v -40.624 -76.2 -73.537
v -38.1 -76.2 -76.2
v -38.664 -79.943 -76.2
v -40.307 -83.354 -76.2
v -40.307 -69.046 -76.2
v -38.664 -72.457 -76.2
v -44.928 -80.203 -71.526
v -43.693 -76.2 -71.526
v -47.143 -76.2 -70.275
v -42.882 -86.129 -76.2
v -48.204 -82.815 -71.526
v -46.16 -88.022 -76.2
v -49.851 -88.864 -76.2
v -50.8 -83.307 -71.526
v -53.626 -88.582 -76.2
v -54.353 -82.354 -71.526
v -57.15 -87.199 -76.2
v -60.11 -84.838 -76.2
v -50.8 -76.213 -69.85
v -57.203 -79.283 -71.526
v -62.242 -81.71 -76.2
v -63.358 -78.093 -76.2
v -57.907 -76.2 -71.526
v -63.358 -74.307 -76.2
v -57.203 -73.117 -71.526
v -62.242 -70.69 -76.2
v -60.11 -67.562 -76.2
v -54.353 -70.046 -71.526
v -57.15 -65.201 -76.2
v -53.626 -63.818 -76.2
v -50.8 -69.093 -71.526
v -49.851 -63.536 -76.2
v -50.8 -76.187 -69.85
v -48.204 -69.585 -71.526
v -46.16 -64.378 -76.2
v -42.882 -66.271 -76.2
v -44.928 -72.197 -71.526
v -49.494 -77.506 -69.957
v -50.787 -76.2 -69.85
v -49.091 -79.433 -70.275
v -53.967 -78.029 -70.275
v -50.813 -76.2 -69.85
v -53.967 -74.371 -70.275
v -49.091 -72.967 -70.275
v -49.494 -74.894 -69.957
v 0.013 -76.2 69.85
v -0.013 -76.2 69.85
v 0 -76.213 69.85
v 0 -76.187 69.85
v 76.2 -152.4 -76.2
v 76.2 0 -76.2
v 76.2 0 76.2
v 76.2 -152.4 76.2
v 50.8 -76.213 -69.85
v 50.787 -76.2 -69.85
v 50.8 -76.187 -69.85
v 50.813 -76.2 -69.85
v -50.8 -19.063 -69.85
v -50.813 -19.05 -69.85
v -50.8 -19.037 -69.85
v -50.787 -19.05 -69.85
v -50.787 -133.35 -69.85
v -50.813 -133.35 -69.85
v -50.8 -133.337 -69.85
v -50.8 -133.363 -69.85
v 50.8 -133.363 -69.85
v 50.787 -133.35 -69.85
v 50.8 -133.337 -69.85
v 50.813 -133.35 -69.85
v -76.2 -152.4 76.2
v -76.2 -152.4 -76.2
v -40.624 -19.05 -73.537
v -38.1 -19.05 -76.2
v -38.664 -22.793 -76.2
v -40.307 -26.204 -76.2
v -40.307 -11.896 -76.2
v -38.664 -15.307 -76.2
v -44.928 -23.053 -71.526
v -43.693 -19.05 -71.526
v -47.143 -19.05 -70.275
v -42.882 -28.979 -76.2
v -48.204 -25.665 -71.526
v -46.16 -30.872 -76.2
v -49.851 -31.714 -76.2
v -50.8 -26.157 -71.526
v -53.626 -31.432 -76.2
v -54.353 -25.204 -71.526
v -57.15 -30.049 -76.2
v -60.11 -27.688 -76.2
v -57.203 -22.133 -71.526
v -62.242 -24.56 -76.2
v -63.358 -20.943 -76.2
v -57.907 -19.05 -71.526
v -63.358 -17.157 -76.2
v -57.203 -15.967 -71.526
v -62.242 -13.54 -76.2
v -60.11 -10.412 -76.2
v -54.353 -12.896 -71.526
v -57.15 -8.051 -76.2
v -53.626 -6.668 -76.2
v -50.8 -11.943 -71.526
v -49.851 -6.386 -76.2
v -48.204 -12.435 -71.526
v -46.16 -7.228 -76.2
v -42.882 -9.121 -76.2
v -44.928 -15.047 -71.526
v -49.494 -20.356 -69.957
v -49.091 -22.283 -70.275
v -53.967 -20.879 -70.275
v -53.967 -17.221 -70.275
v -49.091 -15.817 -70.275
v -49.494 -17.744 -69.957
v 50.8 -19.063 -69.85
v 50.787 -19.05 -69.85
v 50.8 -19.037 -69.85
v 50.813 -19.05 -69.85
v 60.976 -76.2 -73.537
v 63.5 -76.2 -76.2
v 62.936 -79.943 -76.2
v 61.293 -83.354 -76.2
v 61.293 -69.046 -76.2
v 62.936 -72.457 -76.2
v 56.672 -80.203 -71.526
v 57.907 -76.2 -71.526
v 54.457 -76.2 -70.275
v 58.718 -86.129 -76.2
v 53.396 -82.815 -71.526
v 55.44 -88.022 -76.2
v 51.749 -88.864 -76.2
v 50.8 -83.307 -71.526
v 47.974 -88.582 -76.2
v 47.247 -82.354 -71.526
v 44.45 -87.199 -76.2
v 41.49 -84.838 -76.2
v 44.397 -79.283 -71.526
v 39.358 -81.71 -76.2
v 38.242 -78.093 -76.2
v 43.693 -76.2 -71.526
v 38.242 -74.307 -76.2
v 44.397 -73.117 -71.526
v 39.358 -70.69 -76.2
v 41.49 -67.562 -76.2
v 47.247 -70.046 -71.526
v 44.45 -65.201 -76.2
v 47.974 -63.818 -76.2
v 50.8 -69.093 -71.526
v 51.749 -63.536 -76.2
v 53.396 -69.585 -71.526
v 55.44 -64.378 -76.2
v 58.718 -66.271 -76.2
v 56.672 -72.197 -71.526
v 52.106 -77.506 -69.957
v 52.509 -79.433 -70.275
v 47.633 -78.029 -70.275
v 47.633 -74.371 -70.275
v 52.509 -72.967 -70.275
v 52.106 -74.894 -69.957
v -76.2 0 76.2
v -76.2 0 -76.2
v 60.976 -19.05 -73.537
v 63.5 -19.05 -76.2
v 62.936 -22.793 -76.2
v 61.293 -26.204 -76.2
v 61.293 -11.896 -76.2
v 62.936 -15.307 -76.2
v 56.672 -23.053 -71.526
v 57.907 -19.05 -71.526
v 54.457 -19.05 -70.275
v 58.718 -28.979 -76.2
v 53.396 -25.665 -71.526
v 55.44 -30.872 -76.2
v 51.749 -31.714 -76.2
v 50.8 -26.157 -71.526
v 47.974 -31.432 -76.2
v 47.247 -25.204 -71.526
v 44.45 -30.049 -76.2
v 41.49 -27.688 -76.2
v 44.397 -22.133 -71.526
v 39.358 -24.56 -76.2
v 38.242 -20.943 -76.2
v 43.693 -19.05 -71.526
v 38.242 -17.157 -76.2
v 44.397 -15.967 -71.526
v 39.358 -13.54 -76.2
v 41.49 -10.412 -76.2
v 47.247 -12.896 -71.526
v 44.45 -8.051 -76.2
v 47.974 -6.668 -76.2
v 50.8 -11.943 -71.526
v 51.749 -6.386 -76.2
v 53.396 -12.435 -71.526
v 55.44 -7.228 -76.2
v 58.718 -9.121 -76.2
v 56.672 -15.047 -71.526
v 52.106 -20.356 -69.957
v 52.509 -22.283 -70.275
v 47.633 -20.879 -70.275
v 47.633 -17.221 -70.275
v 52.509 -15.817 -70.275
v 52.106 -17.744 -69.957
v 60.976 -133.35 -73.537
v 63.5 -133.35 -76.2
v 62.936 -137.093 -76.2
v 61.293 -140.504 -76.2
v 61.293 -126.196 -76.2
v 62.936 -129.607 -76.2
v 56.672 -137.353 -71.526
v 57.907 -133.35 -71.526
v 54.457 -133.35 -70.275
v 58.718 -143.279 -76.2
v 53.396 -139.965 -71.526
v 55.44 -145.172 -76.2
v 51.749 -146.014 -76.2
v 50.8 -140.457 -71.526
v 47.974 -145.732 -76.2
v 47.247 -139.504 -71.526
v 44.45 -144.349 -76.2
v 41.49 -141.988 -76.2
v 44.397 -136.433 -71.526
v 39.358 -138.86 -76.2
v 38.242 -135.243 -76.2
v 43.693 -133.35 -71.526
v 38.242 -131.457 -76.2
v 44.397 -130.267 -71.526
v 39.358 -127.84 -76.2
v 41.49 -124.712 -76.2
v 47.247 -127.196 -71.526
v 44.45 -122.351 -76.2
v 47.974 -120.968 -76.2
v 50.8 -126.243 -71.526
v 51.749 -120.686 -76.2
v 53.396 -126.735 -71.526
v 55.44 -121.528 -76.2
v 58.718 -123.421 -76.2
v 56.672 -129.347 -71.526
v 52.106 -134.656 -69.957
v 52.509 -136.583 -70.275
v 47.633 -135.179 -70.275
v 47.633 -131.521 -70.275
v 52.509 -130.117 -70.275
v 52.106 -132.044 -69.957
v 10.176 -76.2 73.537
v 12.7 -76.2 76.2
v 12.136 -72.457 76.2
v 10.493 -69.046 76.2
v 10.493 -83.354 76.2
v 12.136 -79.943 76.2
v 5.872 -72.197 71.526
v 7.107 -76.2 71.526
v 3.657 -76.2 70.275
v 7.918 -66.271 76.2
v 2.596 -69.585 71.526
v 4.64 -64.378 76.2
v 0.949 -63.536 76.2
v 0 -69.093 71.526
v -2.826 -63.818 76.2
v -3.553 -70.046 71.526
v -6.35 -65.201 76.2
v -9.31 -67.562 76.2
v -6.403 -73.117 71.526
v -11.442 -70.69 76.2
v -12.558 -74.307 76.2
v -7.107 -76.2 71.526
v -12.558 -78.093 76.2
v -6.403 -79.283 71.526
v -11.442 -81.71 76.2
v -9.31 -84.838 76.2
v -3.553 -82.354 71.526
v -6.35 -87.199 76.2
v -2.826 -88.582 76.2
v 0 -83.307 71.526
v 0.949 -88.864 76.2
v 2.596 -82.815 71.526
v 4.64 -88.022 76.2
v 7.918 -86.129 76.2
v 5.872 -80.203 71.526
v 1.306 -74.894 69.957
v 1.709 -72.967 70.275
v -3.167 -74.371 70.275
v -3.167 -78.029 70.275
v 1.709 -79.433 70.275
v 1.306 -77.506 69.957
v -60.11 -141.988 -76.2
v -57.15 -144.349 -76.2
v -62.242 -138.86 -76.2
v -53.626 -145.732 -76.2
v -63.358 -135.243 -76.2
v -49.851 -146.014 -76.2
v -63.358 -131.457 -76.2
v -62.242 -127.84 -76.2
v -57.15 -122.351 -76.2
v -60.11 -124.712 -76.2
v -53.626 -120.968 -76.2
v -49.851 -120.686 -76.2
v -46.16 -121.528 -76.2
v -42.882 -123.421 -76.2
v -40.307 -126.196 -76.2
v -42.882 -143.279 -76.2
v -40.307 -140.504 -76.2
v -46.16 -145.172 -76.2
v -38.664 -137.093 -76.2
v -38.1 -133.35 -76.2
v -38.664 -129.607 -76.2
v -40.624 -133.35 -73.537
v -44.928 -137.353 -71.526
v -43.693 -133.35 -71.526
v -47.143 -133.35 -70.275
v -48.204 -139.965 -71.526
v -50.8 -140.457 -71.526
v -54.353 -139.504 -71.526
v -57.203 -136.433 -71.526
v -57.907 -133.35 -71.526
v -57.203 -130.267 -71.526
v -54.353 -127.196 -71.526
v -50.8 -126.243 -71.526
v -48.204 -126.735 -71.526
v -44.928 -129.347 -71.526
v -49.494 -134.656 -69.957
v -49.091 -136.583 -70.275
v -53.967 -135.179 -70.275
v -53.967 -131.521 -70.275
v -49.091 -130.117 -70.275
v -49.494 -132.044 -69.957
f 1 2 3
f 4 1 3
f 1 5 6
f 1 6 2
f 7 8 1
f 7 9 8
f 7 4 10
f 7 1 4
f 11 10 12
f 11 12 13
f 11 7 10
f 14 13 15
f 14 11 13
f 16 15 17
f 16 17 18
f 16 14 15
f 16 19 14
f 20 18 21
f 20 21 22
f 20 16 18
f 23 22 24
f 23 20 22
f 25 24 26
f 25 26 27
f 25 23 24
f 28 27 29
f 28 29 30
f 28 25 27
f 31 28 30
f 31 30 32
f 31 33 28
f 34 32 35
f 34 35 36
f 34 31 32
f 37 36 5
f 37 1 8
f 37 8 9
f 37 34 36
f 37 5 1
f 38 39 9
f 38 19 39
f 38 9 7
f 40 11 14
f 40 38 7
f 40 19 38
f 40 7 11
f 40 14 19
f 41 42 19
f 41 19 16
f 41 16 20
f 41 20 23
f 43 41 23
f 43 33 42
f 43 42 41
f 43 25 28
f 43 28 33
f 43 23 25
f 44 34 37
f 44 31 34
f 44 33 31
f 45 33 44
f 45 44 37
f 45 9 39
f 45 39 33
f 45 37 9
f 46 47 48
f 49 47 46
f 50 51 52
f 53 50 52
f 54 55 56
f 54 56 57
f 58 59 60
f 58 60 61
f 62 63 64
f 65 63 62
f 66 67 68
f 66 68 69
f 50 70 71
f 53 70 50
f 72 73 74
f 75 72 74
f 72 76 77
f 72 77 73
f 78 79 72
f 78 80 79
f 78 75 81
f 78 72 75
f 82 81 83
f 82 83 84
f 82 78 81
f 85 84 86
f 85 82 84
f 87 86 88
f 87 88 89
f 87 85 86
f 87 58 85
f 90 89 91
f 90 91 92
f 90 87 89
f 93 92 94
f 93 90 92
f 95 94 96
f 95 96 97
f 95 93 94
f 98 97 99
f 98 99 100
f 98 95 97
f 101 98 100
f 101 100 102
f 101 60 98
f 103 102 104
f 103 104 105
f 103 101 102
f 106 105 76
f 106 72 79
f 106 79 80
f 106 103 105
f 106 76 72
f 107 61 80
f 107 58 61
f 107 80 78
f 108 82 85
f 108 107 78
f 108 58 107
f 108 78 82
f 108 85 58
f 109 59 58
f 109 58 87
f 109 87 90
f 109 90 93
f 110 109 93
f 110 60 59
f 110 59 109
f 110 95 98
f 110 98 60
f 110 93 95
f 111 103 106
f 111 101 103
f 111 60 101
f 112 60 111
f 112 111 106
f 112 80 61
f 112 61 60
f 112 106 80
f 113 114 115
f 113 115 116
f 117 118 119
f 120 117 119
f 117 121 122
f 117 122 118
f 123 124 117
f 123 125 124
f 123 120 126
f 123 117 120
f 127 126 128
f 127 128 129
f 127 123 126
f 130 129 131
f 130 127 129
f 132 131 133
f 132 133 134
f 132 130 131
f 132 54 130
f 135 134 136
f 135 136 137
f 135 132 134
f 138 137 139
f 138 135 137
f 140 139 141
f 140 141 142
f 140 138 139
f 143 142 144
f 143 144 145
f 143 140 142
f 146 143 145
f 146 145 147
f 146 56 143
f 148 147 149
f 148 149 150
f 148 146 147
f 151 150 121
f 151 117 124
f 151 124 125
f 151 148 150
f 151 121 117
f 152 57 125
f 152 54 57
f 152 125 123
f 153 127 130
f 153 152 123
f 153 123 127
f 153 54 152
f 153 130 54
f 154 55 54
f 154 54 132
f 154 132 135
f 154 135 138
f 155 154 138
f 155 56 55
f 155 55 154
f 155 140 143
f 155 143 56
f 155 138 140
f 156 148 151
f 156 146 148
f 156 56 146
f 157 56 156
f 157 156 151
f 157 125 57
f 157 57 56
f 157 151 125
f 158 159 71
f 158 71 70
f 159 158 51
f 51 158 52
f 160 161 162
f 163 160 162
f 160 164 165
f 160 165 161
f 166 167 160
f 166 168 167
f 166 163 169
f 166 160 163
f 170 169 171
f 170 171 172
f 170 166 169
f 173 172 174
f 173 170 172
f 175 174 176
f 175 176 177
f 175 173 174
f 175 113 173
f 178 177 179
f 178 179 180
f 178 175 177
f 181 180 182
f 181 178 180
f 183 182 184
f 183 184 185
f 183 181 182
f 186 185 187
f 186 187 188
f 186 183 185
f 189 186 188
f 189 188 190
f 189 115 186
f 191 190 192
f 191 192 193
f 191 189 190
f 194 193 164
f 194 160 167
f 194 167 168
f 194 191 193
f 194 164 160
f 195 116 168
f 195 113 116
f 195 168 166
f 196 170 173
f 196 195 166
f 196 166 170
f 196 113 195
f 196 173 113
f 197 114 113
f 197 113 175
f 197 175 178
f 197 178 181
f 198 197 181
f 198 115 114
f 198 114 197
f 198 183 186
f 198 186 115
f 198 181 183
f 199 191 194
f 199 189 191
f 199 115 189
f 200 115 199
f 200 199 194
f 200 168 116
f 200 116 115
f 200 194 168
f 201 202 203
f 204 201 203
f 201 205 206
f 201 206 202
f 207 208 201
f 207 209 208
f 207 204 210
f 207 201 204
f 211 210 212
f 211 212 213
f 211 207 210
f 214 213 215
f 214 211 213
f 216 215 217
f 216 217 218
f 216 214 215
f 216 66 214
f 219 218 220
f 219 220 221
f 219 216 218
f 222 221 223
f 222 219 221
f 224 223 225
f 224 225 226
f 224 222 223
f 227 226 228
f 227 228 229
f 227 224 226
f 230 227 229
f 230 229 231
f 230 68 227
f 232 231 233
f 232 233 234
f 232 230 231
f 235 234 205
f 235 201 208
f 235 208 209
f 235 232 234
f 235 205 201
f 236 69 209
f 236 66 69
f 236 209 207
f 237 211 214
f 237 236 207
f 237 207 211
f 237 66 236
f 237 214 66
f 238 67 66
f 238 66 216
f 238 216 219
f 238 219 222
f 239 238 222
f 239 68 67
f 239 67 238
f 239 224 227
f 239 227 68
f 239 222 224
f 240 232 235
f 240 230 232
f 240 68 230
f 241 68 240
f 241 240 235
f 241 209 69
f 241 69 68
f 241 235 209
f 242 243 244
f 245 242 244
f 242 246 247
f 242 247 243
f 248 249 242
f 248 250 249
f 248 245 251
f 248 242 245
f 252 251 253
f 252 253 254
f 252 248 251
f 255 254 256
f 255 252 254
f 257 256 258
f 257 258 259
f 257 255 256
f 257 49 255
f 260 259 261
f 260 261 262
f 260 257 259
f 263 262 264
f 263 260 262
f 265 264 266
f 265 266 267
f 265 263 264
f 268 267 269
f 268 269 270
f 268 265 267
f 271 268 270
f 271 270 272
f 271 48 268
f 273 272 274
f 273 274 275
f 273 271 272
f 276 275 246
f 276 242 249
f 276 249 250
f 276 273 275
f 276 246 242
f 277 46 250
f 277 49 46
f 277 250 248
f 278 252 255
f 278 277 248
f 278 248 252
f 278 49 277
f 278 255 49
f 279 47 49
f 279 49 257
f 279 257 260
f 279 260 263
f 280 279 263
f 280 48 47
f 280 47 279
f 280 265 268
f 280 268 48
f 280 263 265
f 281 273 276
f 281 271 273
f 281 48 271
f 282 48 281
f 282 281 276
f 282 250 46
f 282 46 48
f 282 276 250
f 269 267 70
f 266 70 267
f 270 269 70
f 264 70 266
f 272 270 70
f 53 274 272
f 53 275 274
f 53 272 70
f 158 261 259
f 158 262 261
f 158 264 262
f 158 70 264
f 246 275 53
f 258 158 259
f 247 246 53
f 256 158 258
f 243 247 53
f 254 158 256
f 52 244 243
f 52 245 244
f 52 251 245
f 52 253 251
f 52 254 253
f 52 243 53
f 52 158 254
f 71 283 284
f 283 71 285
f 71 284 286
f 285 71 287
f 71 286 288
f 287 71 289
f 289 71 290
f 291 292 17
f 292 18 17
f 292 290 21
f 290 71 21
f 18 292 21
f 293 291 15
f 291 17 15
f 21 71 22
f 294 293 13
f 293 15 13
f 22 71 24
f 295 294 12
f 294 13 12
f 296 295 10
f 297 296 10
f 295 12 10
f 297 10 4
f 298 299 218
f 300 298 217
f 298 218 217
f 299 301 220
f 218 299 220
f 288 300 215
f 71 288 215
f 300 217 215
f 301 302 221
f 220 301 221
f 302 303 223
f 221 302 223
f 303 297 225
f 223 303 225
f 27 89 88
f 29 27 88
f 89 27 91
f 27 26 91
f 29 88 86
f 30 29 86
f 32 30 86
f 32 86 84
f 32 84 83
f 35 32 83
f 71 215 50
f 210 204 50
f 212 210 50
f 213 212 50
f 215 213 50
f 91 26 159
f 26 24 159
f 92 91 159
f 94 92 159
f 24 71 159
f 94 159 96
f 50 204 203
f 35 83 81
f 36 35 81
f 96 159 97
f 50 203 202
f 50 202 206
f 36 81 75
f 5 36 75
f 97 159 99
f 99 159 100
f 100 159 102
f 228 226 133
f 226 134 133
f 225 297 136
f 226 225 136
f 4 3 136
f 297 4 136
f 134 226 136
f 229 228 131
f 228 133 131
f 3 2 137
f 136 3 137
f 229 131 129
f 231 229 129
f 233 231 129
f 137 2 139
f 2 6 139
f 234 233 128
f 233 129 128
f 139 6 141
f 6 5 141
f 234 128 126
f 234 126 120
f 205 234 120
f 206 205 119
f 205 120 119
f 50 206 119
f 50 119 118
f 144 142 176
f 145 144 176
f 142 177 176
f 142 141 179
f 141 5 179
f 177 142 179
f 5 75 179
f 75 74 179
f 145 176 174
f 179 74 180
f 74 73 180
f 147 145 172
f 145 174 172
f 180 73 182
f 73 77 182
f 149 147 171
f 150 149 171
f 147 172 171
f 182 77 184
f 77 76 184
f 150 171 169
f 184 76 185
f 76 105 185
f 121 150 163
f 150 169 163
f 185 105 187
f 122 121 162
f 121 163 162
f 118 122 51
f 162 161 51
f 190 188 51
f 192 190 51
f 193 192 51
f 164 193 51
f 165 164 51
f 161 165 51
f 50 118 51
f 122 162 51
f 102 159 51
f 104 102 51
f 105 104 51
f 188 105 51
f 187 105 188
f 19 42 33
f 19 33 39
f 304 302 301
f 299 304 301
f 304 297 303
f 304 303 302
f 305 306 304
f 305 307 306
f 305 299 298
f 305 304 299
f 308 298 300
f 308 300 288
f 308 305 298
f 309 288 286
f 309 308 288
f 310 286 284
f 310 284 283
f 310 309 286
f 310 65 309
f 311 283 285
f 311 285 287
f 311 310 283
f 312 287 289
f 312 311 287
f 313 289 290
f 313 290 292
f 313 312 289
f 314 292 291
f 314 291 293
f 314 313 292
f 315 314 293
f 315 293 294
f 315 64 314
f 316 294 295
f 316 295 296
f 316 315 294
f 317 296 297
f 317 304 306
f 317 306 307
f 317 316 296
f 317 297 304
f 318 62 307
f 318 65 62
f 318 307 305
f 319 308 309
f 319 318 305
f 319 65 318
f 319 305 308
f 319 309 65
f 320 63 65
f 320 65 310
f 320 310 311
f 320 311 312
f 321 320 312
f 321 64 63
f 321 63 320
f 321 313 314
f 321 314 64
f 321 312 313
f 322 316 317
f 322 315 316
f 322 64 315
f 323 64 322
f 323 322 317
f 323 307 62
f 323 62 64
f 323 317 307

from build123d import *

# Parameters (mm, degrees)
F0_W     = 152.4
F0_H     = 152.4
F1_DEPTH = 152.4
F2_R     = 12.7
F3_DEPTH = 6.35
F5_R     = 12.7
F6_DEPTH = 6.35
F8_R     = 12.7
F9_DEPTH = 6.35


# Not quite as in the source:
# - a fillet or chamfer that OpenCascade refuses, or shapes differently, is made with other operations: its cross-section is extruded or revolved along the edge and cut away or added


with BuildPart() as f1:
    # F0 (on Front) → F1 (new body)
    with BuildSketch(Plane.XZ):
        Rectangle(F0_W, F0_H)
    extrude(amount=F1_DEPTH)

    # F2 (on face) → F3 (cut)
    with BuildSketch(Plane.XY.offset(76.2)):
        with Locations((0, -76.2)):
            Circle(F2_R)
    extrude(amount=-F3_DEPTH, mode=Mode.SUBTRACT)

    # F4: fillet of radius 15.8496 on 1 edges, made by hand

    # F4_s1 → F4_t2 (revolve)
    with BuildSketch(Plane.XZ.offset(76.2)):
        with BuildLine():
            ThreePointArc((12.7, 76.2), (7.1065402986, 71.5261268844), (0.0127063564, 69.85))
            Line((0.0127063564, 69.85), (12.7, 69.85))
            Line((12.7, 69.85), (12.7, 76.2))
        make_face()
    revolve(axis=Axis((0, -76.2, 69.85), (0, 0, 1)))

    # F5 (on face) → F6 (cut)
    with BuildSketch(Plane(origin=(0, 0, -76.2), x_dir=(1, 0, 0), z_dir=(0, 0, -1))):
        with Locations((50.8, 19.05)):
            Circle(F5_R)
        with Locations((50.8, 76.2)):
            Circle(F5_R)
        with Locations((-50.8, 19.05)):
            Circle(F5_R)
        with Locations((-50.8, 76.2)):
            Circle(F5_R)
        with Locations((-50.8, 133.35)):
            Circle(F5_R)
        with Locations((50.8, 133.35)):
            Circle(F5_R)
    extrude(amount=-F6_DEPTH, mode=Mode.SUBTRACT)

    # F7: fillet of radius 15.8496 on 6 edges, made by hand

    # F7_s1 → F7_t2 (revolve)
    with BuildSketch(Plane.XZ.offset(19.05)):
        with BuildLine():
            ThreePointArc((63.5, -76.2), (57.9065402986, -71.5261268844), (50.8127063564, -69.85))
            Line((50.8127063564, -69.85), (63.5, -69.85))
            Line((63.5, -69.85), (63.5, -76.2))
        make_face()
    revolve(axis=Axis((50.8, -19.05, -69.85), (0, 0, -1)))

    # F7_s3 → F7_t4 (revolve)
    with BuildSketch(Plane.XZ.offset(76.2)):
        with BuildLine():
            ThreePointArc((63.5, -76.2), (57.9065402986, -71.5261268844), (50.8127063564, -69.85))
            Line((50.8127063564, -69.85), (63.5, -69.85))
            Line((63.5, -69.85), (63.5, -76.2))
        make_face()
    revolve(axis=Axis((50.8, -76.2, -69.85), (0, 0, -1)))

    # F7_s5 → F7_t6 (revolve)
    with BuildSketch(Plane.XZ.offset(133.35)):
        with BuildLine():
            ThreePointArc((63.5, -76.2), (57.9065402986, -71.5261268844), (50.8127063564, -69.85))
            Line((50.8127063564, -69.85), (63.5, -69.85))
            Line((63.5, -69.85), (63.5, -76.2))
        make_face()
    revolve(axis=Axis((50.8, -133.35, -69.85), (0, 0, -1)))

    # F7_s7 → F7_t8 (revolve)
    with BuildSketch(Plane.XZ.offset(19.05)):
        with BuildLine():
            ThreePointArc((-38.1, -76.2), (-43.6934597014, -71.5261268844), (-50.7872936436, -69.85))
            Line((-50.7872936436, -69.85), (-38.1, -69.85))
            Line((-38.1, -69.85), (-38.1, -76.2))
        make_face()
    revolve(axis=Axis((-50.8, -19.05, -69.85), (0, 0, -1)))

    # F7_s9 → F7_t10 (revolve)
    with BuildSketch(Plane.XZ.offset(76.2)):
        with BuildLine():
            ThreePointArc((-38.1, -76.2), (-43.6934597014, -71.5261268844), (-50.7872936436, -69.85))
            Line((-50.7872936436, -69.85), (-38.1, -69.85))
            Line((-38.1, -69.85), (-38.1, -76.2))
        make_face()
    revolve(axis=Axis((-50.8, -76.2, -69.85), (0, 0, -1)))

    # F7_s11 → F7_t12 (revolve)
    with BuildSketch(Plane.XZ.offset(133.35)):
        with BuildLine():
            ThreePointArc((-38.1, -76.2), (-43.6934597014, -71.5261268844), (-50.7872936436, -69.85))
            Line((-50.7872936436, -69.85), (-38.1, -69.85))
            Line((-38.1, -69.85), (-38.1, -76.2))
        make_face()
    revolve(axis=Axis((-50.8, -133.35, -69.85), (0, 0, -1)))

    # F8 (on face) → F9 (join)
    with BuildSketch(Plane(origin=(0, 0, 0), x_dir=(-1, 0, 0), z_dir=(0, 1, 0))):
        with Locations((50.8, -57.15)):
            Circle(F8_R)
        with Locations((-50.8, -57.15)):
            Circle(F8_R)
        with Locations((-50.8, 57.15)):
            Circle(F8_R)
        with Locations((50.8, 57.15)):
            Circle(F8_R)
    extrude(amount=-F9_DEPTH)


solid = f1.part
